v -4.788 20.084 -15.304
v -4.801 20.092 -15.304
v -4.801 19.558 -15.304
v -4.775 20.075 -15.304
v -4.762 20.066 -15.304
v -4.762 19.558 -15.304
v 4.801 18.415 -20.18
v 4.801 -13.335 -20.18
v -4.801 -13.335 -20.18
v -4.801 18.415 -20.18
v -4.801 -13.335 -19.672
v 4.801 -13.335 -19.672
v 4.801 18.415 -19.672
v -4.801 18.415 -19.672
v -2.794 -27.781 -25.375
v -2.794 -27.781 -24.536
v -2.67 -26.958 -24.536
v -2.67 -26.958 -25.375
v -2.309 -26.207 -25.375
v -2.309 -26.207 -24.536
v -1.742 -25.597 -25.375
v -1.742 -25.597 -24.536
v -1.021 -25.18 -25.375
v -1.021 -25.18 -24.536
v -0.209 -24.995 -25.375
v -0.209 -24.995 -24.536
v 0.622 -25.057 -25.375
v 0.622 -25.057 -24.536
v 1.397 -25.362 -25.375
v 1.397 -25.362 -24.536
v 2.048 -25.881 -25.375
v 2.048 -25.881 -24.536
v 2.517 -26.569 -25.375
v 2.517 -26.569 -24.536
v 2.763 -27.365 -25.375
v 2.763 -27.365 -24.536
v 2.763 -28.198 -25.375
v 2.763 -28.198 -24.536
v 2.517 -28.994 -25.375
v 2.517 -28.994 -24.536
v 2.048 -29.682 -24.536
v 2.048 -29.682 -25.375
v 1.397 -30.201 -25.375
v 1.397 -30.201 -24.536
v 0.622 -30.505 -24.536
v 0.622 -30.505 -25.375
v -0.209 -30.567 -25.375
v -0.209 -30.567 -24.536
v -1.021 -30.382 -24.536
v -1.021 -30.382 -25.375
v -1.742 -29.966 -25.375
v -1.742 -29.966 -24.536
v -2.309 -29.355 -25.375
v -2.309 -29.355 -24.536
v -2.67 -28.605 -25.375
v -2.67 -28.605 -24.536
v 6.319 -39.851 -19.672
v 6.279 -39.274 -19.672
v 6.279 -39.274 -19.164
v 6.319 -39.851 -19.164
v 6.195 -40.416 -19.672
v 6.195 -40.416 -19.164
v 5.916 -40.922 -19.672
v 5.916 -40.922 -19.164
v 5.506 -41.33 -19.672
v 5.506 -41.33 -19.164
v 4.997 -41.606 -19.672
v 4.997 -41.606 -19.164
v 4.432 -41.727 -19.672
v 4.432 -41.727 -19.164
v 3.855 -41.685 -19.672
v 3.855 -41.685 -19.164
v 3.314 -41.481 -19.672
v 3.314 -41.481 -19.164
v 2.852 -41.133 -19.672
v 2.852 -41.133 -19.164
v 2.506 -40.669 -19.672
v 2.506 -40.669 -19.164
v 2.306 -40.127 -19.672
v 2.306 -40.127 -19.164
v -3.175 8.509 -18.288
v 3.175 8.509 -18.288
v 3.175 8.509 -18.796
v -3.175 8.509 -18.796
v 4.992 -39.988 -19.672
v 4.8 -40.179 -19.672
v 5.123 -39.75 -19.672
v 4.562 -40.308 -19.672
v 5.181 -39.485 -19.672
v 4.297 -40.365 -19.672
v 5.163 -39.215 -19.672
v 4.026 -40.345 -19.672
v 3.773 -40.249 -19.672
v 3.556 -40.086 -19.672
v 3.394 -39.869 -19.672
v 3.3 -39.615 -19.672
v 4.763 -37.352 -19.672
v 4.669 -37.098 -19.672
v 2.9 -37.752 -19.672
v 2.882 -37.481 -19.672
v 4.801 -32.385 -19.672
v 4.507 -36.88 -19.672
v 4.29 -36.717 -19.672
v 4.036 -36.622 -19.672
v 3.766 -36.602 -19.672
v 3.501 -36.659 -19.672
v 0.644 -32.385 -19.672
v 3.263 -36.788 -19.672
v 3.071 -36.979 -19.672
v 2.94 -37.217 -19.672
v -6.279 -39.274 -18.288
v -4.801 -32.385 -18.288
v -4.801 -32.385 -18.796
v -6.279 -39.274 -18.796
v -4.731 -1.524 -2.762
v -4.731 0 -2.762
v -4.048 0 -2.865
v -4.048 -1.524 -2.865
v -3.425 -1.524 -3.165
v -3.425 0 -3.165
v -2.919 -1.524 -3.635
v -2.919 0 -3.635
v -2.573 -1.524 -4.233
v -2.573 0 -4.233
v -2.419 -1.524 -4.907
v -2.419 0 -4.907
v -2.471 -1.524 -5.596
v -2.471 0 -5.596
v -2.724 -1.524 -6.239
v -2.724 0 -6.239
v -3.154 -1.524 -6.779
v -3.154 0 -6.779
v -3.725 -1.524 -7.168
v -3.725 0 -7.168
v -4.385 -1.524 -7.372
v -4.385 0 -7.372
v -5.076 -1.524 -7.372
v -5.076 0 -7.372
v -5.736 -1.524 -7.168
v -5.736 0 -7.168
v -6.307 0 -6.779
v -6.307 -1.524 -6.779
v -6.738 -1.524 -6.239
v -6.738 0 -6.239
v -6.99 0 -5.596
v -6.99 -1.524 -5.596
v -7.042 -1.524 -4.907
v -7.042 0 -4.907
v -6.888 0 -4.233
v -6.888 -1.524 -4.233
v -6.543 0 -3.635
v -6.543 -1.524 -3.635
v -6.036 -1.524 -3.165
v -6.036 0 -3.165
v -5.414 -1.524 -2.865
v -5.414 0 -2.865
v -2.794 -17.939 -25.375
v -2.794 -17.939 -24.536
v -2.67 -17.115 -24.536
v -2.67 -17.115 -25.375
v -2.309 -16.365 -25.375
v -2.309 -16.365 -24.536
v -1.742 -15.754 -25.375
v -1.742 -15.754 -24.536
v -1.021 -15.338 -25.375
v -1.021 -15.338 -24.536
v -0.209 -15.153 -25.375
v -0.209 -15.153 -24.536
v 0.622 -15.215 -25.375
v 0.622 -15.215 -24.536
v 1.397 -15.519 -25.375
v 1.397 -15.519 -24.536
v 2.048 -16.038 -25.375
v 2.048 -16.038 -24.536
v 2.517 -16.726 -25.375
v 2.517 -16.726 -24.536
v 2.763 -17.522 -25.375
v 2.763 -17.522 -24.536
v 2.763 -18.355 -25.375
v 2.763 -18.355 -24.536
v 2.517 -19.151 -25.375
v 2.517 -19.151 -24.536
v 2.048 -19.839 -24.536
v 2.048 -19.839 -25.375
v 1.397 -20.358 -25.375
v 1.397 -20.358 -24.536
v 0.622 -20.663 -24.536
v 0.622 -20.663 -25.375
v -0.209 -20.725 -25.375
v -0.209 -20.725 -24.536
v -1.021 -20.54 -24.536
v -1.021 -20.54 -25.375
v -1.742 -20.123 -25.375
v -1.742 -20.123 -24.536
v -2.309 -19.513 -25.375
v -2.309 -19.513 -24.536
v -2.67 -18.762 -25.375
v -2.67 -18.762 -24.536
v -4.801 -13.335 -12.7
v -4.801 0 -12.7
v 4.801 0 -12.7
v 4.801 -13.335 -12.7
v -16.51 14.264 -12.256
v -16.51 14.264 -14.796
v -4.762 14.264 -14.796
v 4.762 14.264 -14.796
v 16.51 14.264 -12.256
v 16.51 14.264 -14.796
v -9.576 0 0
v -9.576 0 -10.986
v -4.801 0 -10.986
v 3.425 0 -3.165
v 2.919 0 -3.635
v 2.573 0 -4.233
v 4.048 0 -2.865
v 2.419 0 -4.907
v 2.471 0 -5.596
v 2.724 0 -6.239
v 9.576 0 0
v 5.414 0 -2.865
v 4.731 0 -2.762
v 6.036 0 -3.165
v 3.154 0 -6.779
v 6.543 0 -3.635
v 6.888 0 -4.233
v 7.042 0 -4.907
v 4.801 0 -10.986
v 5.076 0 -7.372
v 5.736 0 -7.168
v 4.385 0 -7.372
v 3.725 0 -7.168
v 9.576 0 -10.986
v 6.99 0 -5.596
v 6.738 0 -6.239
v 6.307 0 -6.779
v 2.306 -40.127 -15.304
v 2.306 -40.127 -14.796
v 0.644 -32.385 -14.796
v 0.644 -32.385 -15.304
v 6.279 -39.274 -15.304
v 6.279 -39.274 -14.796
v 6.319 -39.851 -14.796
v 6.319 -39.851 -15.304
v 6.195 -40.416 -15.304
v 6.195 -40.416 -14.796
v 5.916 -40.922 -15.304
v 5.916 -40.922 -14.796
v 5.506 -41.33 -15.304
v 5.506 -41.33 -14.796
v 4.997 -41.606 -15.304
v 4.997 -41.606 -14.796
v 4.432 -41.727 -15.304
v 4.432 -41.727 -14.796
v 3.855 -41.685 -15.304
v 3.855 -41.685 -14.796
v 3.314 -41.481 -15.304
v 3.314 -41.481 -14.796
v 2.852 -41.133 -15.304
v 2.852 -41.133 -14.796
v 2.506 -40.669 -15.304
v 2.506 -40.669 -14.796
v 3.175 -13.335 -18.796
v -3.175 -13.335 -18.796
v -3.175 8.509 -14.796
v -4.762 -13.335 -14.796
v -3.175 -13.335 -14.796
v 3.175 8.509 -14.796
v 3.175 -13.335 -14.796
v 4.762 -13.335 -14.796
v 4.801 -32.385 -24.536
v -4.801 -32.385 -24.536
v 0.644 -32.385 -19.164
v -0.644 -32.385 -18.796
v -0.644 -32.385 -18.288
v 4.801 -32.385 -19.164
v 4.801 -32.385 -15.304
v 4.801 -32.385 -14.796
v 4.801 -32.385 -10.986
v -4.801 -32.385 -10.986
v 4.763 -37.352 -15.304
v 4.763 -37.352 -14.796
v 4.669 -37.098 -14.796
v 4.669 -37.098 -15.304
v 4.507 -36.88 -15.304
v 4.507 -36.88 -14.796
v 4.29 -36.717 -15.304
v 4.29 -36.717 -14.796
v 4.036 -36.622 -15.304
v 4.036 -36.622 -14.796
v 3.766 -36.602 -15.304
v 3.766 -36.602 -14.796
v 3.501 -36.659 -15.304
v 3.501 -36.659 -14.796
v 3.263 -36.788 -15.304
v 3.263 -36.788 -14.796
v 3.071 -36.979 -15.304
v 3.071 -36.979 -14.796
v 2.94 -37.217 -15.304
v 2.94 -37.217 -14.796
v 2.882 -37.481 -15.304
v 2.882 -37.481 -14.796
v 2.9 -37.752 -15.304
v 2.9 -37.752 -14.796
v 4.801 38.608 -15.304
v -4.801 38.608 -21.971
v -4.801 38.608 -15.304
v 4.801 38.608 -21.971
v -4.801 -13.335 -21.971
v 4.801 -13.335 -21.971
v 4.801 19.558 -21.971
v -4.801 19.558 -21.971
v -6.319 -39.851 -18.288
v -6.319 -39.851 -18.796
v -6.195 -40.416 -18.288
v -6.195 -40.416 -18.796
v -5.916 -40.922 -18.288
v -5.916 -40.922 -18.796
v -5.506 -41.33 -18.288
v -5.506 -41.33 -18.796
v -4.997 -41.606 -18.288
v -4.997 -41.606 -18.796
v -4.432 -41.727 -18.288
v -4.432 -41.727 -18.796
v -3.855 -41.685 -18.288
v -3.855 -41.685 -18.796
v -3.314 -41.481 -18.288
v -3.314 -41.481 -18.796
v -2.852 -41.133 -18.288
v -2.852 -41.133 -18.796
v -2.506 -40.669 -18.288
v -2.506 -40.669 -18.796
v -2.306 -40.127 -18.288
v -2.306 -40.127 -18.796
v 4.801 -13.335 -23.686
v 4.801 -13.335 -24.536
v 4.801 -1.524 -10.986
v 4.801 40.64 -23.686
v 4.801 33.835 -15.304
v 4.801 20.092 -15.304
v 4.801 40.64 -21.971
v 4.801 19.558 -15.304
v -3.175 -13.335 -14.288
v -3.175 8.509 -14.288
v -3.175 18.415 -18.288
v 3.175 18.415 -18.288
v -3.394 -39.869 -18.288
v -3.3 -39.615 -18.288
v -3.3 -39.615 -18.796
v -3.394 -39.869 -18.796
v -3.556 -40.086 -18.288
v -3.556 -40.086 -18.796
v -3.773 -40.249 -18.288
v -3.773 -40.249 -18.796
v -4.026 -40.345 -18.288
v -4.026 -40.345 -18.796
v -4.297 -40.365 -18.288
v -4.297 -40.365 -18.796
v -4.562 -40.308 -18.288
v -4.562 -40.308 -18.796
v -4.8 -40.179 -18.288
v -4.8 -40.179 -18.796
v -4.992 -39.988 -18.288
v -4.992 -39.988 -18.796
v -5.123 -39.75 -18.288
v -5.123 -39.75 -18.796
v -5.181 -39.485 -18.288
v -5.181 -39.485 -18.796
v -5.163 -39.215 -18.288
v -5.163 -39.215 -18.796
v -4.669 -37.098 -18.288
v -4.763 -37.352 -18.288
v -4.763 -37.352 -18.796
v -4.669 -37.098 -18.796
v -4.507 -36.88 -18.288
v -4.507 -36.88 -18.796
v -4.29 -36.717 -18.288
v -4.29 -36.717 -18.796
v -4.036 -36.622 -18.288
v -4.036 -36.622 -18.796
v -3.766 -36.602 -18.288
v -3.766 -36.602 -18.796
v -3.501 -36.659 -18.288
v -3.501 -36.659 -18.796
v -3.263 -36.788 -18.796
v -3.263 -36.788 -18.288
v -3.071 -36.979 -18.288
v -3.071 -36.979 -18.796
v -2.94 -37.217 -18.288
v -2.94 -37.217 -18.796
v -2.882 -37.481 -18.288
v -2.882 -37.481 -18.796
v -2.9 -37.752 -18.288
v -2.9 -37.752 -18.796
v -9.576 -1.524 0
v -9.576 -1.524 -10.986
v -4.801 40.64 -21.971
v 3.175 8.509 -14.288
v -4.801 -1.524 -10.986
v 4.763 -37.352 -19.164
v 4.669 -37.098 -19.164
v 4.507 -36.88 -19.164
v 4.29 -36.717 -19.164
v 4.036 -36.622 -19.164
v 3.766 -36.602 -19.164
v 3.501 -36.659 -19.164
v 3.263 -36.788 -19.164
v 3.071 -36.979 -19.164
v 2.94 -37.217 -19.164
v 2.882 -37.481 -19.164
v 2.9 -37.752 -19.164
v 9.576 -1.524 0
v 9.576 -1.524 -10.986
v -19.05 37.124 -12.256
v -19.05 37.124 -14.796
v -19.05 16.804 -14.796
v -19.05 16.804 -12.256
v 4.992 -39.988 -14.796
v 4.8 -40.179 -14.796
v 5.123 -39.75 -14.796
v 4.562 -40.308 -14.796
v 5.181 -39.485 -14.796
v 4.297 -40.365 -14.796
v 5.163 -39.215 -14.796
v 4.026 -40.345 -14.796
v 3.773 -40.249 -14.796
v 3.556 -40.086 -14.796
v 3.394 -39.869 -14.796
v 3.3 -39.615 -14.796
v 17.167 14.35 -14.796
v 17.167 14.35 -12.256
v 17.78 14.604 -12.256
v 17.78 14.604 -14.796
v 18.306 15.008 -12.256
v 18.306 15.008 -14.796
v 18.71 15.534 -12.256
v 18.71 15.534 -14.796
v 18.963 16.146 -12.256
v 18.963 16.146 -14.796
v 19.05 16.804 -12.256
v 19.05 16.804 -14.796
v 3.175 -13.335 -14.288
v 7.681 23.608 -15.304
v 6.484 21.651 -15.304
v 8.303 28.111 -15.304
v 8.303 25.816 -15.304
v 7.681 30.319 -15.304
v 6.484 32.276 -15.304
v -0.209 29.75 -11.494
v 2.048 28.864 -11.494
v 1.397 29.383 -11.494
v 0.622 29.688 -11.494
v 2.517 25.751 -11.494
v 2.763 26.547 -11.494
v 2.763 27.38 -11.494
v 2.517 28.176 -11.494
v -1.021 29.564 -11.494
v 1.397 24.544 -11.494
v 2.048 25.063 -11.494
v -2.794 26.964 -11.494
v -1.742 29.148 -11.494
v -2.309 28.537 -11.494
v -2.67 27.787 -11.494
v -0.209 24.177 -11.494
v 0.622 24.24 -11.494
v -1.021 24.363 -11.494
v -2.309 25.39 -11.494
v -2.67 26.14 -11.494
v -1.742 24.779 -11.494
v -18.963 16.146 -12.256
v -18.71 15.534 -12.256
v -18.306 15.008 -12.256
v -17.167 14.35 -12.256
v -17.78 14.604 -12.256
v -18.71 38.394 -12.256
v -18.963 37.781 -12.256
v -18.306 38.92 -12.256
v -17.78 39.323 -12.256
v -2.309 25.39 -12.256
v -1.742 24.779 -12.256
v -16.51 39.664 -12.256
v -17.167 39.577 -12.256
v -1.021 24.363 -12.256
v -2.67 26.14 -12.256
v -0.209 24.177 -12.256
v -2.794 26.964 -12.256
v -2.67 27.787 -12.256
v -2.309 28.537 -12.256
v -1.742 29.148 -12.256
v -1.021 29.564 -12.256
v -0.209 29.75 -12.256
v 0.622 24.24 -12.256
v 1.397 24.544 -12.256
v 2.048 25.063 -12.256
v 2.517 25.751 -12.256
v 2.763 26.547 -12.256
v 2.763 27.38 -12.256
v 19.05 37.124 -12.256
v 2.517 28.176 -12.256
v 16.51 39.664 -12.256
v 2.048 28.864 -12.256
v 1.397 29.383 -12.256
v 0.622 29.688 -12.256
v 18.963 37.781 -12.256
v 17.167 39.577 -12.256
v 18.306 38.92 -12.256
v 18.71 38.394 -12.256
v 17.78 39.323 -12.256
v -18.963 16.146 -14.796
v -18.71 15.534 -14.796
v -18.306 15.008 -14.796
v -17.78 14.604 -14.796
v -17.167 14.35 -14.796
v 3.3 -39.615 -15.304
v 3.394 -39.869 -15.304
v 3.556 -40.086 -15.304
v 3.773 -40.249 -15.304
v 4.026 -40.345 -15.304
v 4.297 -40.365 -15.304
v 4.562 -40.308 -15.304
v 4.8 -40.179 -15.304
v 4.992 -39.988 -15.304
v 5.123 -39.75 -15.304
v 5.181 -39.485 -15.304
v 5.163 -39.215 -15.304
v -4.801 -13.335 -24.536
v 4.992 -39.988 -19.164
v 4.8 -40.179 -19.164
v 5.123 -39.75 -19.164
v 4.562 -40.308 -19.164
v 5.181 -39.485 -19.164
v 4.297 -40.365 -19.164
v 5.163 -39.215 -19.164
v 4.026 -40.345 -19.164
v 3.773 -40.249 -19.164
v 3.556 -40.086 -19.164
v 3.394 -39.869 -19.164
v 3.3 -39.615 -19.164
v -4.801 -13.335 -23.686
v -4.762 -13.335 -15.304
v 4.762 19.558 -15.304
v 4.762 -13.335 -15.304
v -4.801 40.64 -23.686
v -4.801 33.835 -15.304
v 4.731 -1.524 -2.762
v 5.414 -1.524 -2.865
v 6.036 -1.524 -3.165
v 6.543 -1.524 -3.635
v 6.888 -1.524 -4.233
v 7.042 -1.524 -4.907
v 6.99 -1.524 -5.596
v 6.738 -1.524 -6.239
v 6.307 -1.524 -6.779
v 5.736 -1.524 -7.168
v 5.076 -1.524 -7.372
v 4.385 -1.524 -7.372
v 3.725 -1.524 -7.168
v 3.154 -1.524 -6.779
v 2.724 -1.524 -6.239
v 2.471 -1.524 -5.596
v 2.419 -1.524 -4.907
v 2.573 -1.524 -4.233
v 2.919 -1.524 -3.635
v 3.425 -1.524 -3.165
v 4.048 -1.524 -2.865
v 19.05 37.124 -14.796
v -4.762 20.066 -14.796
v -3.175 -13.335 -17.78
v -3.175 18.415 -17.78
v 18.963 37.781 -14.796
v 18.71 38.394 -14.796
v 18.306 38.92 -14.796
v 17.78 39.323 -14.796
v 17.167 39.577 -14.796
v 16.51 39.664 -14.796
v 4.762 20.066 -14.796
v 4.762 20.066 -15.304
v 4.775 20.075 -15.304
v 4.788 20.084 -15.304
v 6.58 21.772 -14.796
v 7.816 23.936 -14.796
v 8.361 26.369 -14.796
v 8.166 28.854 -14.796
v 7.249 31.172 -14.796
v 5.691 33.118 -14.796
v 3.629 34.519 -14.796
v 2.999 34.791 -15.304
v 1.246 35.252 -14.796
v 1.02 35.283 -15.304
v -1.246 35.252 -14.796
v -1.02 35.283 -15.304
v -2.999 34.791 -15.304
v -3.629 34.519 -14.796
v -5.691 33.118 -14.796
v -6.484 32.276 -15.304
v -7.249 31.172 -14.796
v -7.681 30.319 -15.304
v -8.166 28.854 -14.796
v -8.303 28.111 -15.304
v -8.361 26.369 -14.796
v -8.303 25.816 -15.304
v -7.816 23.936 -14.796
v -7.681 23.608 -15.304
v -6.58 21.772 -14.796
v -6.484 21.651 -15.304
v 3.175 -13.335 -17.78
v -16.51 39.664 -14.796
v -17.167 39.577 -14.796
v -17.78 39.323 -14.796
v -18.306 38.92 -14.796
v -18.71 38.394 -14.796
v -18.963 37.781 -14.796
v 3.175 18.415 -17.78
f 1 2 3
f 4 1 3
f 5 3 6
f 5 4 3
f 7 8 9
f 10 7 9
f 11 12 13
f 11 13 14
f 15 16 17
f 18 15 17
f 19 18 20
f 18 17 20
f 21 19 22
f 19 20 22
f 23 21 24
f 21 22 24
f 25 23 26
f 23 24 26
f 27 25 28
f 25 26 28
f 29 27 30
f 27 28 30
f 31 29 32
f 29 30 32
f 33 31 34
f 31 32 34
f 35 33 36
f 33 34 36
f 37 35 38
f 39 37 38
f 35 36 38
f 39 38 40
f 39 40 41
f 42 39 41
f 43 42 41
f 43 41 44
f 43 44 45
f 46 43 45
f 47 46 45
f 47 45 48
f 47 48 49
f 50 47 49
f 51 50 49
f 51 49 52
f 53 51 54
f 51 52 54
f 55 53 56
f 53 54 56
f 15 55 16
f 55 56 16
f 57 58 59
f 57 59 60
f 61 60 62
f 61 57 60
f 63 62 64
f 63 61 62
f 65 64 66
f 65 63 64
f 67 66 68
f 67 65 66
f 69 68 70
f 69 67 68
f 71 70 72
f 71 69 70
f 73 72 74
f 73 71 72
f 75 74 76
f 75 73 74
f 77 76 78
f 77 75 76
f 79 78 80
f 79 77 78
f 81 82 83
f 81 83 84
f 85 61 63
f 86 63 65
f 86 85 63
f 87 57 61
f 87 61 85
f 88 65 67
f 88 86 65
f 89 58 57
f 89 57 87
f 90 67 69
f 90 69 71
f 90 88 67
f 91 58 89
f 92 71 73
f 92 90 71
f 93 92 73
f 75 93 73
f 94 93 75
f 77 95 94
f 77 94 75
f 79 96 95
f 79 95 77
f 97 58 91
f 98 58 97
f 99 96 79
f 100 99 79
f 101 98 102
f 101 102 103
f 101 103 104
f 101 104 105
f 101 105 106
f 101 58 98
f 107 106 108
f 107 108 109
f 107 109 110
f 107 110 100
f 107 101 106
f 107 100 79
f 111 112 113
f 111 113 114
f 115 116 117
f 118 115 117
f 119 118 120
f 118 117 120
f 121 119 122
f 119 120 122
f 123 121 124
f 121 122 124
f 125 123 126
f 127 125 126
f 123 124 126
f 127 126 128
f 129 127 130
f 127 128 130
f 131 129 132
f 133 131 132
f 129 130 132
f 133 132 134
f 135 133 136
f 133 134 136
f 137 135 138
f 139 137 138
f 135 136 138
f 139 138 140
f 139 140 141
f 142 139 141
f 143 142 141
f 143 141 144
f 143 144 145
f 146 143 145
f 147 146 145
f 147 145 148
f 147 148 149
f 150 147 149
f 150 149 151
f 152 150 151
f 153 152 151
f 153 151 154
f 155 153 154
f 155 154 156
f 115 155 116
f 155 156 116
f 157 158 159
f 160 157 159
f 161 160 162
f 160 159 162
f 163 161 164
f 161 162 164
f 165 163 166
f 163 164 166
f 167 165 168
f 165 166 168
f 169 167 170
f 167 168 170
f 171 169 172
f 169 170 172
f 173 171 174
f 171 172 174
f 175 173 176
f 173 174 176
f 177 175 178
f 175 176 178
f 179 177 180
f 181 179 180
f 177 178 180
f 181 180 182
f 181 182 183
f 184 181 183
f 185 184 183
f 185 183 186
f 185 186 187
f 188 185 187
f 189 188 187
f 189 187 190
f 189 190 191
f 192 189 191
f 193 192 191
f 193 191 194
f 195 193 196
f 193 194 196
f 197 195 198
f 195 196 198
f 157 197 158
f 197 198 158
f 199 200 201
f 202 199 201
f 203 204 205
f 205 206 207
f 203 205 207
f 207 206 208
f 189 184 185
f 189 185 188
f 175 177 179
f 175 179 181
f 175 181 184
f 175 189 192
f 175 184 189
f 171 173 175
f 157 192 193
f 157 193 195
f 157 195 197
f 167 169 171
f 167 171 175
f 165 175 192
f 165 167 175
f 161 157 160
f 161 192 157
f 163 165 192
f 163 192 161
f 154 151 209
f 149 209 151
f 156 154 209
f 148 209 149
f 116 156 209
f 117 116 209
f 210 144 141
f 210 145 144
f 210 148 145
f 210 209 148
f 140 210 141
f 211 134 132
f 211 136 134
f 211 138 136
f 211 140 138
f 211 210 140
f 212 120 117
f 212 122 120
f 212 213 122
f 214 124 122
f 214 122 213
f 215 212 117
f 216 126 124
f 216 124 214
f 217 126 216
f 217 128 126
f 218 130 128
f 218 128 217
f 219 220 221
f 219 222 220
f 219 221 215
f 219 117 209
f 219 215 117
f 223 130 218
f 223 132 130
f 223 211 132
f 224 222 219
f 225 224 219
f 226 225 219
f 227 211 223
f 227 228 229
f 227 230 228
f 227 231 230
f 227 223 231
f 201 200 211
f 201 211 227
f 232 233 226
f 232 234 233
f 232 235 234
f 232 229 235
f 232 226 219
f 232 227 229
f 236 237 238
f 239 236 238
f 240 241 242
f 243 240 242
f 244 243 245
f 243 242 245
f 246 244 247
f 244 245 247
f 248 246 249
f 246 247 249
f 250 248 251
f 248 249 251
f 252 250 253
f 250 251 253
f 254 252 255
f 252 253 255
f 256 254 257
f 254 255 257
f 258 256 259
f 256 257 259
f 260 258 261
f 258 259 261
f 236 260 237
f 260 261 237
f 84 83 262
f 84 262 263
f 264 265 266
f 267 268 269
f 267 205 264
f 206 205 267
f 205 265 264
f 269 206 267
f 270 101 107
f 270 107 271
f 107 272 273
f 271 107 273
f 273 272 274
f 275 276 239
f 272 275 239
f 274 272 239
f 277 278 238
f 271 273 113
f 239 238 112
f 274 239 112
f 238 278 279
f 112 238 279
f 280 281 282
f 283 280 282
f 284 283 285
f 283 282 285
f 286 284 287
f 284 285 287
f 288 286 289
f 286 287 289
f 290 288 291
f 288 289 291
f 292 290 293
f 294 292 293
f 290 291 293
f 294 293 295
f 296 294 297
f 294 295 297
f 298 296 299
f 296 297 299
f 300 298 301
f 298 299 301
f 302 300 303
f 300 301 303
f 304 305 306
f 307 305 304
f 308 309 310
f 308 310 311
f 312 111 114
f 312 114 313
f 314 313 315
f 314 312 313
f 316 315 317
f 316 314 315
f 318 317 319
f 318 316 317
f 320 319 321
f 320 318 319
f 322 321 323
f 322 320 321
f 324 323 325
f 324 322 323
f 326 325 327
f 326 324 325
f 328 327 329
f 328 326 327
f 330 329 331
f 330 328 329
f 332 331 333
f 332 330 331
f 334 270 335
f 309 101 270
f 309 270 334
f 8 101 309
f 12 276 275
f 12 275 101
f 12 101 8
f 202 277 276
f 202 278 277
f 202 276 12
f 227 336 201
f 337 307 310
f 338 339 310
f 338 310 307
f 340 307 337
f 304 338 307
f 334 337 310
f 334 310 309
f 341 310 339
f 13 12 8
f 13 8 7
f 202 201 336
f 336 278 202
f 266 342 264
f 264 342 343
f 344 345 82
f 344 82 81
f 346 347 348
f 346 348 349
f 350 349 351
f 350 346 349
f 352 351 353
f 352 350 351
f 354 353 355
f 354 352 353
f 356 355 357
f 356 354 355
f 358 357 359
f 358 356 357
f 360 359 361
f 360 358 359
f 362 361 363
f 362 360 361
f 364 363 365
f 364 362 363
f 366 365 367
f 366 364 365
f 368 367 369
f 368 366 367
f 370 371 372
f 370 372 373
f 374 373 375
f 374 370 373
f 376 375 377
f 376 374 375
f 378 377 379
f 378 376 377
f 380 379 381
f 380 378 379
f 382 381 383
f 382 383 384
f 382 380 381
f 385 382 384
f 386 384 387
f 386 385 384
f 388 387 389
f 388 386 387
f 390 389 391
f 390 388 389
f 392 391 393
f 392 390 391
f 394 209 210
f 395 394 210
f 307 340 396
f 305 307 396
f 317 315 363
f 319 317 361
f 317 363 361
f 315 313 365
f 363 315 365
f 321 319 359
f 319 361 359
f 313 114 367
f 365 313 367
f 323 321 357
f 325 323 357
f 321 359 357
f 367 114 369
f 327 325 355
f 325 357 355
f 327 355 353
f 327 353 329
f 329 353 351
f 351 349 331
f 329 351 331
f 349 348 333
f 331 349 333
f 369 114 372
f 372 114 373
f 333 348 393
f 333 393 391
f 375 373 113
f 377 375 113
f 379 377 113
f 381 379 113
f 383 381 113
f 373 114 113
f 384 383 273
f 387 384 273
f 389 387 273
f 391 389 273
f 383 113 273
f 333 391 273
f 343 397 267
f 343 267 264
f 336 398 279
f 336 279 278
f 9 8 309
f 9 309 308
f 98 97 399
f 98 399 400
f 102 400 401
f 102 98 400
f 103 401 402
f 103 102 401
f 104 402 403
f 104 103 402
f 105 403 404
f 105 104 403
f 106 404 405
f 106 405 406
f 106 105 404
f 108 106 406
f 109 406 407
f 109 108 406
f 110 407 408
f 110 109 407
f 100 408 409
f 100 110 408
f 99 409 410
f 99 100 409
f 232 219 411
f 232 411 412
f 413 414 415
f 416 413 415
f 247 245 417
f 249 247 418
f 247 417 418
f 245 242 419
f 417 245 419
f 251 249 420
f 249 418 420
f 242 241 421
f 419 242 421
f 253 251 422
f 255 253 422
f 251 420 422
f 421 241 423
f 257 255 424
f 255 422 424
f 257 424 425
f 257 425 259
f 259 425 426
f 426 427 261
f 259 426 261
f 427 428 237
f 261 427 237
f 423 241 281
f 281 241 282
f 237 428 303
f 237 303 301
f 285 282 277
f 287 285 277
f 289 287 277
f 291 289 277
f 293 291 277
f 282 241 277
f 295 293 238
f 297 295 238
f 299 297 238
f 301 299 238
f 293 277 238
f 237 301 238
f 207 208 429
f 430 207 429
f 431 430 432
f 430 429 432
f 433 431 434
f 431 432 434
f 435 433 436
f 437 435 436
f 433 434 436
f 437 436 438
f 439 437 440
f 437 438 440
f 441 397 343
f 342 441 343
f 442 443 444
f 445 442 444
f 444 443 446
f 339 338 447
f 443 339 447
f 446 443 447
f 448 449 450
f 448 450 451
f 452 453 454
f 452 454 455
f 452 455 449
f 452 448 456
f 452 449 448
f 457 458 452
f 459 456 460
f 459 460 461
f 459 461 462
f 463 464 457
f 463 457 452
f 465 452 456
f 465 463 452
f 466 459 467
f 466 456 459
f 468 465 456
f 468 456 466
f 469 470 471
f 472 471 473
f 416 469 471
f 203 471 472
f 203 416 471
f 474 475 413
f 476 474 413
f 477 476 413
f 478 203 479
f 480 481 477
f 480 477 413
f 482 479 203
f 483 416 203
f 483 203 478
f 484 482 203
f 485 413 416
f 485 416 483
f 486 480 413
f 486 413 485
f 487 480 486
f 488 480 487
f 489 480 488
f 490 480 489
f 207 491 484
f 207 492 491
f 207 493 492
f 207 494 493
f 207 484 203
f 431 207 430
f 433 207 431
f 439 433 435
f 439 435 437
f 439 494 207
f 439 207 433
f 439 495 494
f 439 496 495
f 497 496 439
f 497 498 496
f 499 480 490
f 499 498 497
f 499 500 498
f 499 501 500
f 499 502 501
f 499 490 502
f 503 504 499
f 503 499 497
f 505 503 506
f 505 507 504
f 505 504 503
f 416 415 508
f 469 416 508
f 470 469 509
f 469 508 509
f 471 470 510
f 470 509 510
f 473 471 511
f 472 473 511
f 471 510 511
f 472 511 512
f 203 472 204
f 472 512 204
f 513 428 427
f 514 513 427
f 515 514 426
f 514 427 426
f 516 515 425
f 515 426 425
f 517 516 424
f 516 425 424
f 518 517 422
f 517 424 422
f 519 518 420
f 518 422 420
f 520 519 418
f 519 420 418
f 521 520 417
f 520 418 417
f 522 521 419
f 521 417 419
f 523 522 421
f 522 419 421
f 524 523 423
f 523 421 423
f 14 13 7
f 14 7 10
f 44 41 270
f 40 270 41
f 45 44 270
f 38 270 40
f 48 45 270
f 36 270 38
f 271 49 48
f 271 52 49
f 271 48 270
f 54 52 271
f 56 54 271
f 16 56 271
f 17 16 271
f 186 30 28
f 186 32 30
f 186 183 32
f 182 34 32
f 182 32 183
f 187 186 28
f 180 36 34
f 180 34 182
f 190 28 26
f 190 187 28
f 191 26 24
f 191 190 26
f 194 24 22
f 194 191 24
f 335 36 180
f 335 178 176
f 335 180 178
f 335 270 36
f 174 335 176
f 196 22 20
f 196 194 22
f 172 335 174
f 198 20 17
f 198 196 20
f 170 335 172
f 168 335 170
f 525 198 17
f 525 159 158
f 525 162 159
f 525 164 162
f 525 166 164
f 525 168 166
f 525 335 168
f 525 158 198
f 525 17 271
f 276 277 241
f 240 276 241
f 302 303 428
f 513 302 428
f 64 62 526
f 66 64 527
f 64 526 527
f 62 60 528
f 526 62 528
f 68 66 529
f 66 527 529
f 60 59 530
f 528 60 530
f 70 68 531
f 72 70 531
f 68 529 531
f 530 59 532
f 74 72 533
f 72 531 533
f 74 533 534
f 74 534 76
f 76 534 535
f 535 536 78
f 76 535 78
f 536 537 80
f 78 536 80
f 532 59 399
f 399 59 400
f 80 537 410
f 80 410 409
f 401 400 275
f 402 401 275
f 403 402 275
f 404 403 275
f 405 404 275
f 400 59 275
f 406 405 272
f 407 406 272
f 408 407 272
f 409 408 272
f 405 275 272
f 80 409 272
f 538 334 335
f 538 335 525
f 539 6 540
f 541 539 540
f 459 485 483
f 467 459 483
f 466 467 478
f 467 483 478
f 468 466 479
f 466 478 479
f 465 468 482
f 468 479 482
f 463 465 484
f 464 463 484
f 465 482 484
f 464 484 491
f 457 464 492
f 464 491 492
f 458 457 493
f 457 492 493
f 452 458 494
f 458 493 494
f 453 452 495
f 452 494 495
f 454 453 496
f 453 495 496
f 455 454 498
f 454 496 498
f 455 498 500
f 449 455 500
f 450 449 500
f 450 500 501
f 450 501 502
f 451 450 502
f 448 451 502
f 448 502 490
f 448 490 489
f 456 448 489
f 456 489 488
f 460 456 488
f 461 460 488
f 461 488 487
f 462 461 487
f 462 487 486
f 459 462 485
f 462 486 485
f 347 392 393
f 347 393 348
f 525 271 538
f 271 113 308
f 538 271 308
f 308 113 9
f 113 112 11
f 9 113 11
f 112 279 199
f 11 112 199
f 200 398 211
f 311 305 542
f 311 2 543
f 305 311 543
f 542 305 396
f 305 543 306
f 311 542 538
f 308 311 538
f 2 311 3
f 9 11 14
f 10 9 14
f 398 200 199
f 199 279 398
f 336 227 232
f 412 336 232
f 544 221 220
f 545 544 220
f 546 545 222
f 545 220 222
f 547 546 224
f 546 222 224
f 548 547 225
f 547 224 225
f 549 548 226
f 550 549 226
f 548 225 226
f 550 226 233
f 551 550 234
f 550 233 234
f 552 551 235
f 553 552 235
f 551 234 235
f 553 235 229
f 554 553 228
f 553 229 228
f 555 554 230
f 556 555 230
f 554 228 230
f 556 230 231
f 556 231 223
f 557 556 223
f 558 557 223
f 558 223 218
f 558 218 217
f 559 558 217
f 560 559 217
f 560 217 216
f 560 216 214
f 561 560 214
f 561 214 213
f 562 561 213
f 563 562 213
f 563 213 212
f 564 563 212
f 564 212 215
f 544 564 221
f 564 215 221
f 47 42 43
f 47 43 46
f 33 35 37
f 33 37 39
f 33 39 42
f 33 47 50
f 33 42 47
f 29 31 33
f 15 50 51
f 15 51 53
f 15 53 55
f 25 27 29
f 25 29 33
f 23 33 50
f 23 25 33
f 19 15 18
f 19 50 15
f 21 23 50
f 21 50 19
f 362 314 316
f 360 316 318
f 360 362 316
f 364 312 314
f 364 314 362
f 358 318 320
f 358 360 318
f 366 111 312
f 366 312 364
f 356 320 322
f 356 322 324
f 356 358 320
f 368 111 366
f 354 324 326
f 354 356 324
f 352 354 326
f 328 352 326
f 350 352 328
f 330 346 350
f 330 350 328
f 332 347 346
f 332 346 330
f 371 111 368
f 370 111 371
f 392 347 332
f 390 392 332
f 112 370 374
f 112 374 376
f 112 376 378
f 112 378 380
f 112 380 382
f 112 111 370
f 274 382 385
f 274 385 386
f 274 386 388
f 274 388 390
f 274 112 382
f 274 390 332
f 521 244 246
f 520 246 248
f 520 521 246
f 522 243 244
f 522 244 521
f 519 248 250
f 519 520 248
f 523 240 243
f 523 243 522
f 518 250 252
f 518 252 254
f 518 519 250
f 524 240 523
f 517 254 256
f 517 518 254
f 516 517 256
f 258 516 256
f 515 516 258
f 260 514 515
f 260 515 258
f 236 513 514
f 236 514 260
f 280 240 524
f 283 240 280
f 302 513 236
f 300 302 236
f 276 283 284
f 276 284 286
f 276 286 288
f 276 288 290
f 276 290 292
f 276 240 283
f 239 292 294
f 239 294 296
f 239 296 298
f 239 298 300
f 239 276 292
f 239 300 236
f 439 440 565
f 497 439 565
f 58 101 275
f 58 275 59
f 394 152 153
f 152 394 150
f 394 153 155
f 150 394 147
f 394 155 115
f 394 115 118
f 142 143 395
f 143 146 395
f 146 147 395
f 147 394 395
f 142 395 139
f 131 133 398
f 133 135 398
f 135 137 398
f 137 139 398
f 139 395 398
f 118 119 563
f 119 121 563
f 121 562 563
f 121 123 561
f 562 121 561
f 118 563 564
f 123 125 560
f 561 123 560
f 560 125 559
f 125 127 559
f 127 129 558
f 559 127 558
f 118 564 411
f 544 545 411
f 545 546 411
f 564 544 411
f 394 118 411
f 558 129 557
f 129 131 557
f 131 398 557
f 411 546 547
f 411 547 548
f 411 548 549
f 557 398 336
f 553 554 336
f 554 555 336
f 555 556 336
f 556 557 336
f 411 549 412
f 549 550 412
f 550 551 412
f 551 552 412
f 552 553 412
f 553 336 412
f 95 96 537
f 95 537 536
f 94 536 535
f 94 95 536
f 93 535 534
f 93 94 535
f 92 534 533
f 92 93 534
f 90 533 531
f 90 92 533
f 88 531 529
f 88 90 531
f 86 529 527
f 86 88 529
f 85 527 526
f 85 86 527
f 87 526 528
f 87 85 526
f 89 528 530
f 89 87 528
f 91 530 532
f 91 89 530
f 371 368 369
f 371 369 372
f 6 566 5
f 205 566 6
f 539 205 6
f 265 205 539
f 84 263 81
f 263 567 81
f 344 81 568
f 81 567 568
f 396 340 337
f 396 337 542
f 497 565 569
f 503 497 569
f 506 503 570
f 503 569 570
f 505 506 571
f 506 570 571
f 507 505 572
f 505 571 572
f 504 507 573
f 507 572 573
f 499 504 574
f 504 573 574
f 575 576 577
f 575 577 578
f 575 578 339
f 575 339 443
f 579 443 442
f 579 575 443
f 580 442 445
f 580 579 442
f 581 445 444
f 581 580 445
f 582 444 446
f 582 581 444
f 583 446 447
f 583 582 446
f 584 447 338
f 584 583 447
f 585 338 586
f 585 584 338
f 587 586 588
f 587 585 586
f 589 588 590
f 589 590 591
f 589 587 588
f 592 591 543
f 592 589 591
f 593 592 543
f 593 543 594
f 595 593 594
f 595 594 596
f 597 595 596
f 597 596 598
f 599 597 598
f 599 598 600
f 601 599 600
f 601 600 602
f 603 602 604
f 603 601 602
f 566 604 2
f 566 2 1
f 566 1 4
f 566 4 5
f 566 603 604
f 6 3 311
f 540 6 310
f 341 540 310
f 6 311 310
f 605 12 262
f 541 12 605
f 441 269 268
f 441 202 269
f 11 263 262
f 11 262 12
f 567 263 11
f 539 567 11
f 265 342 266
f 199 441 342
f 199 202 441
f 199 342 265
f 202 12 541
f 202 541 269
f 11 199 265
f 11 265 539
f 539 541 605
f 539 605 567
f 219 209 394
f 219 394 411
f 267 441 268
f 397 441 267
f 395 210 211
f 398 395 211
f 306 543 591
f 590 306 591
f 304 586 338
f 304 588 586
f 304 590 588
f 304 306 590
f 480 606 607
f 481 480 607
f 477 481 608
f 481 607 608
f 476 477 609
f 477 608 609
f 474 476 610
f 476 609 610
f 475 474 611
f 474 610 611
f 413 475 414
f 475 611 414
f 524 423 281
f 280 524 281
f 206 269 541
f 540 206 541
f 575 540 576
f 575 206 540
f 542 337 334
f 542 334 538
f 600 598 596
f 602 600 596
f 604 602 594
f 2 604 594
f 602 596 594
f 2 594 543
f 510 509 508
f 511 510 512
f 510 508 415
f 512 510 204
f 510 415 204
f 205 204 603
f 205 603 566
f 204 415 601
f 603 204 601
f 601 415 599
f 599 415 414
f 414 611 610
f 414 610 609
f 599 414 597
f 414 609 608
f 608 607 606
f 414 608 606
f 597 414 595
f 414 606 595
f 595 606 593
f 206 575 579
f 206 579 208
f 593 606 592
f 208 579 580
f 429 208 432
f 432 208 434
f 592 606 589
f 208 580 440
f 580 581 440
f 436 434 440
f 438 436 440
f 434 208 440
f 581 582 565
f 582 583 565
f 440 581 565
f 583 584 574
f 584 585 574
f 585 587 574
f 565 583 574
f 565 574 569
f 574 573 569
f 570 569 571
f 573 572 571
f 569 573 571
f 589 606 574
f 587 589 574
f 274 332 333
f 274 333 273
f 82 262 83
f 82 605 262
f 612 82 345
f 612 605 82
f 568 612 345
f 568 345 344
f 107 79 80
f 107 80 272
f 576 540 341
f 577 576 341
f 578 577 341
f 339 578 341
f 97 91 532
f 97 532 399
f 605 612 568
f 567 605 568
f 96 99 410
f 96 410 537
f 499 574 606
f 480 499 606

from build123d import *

# Parameters (mm, degrees)
SKETCH2_W              = 19.1516
SKETCH2_H              = 10.9855
SKETCH2_R              = 2.31775
BOSS_EXTRUDE1_DEPTH    = 1.524
SKETCH3_W              = 9.6012
SKETCH3_H              = 1.7145
BOSS_EXTRUDE2_DEPTH    = 32.385
SKETCH4_W              = 9.6012
SKETCH4_H              = 19.05
BOSS_EXTRUDE3_DEPTH    = 9.271
SKETCH5_W              = 9.6012
SKETCH5_H              = 73.025
BOSS_EXTRUDE4_DEPTH    = 1.7145
SKETCH6_W              = 9.6012
SKETCH6_H              = 19.05
BOSS_EXTRUDE5_DEPTH    = 0.8509
SKETCH7_W              = 6.35
SKETCH7_H              = 21.844
BOSS_EXTRUDE6_DEPTH    = 0.508
BOSS_EXTRUDE7_DEPTH    = 0.508
SKETCH9_W              = 6.35
SKETCH9_H              = 31.75
BOSS_EXTRUDE8_DEPTH    = 0.508
SKETCH10_W             = 6.35
SKETCH10_H             = 21.844
BOSS_EXTRUDE9_DEPTH    = 0.508
SKETCH11_W             = 9.6012
SKETCH11_H             = 31.75
BOSS_EXTRUDE10_DEPTH   = 0.508
BOSS_EXTRUDE11_DEPTH   = 2.54
SKETCH13_R             = 2.794
BOSS_EXTRUDE12_DEPTH   = 0.762
SKETCH14_W             = 9.6012
SKETCH14_H             = 19.05
BOSS_EXTRUDE13_DEPTH   = 6.6675
BOSS_EXTRUDE14_DEPTH   = 0.508
BOSS_EXTRUDE15_DEPTH   = 0.508
BOSS_EXTRUDE16_DEPTH   = 0.508
SKETCH19_R             = 2.794
BOSS_EXTRUDE17_DEPTH   = 0.8382
BOSS_EXTRUDE17_2_DEPTH = 0.8382


with BuildPart() as part:
    # Sketch2 → Boss-Extrude1 (new body)
    with BuildSketch(Plane(origin=(0, 0, 0), x_dir=(1, 0, 0), z_dir=(0, 1, 0))):
        with Locations((0, 5.49275)):
            Rectangle(SKETCH2_W, SKETCH2_H)
        with Locations(Location((-4.73075, 5.08, 0), (0, 0, 270))):
            Circle(SKETCH2_R, mode=Mode.SUBTRACT)
        with Locations(Location((4.73075, 5.08, 0), (0, 0, 270))):
            Circle(SKETCH2_R, mode=Mode.SUBTRACT)
    extrude(amount=-BOSS_EXTRUDE1_DEPTH)

    # Sketch3 → Boss-Extrude2 (add)
    with BuildSketch(Plane(origin=(0, 0, 0), x_dir=(1, 0, 0), z_dir=(0, 1, 0))):
        with Locations((0, 11.84275)):
            Rectangle(SKETCH3_W, SKETCH3_H)
    extrude(amount=-BOSS_EXTRUDE2_DEPTH)


with BuildPart() as body_2:
    # Sketch4 → Boss-Extrude3 (new body)
    with BuildSketch(Plane(origin=(0, 0, -12.7), x_dir=(-1, 0, 0), z_dir=(0, 0, -1))):
        with Locations((0, -22.86)):
            Rectangle(SKETCH4_W, SKETCH4_H)
    extrude(amount=BOSS_EXTRUDE3_DEPTH)

    # Sketch7 → Boss-Extrude6 (add)
    with BuildSketch(Plane(origin=(0, 0, -14.2875), x_dir=(-1, 0, 0), z_dir=(0, 0, -1))):
        with Locations((0, -2.413)):
            Rectangle(SKETCH7_W, SKETCH7_H)
    extrude(amount=BOSS_EXTRUDE6_DEPTH)

    # Sketch15 → Boss-Extrude14 (add)
    with BuildSketch(Plane(origin=(0, 0, -14.7955), x_dir=(-1, 0, 0), z_dir=(0, 0, -1))):
        with BuildLine():
            Line((-4.8006, -32.385), (-6.279341549, -39.273723719))
            ThreePointArc((-6.279341549, -39.273723719), (-4.719076281, -41.686941549), (-2.305858451, -40.126676281))
            Line((-2.305858451, -40.126676281), (-0.644021101, -32.385))
            Line((-0.644021101, -32.385), (-4.8006, -32.385))
        make_face()
        with BuildLine():
            Line((-2.90018742, -37.751946457), (-3.300008934, -39.614516659))
            ThreePointArc((-3.300008934, -39.614516659), (-4.431204791, -40.345891003), (-5.162579136, -39.214695145))
            Line((-5.162579136, -39.214695145), (-4.762757622, -37.352124944))
            ThreePointArc((-4.762757622, -37.352124944), (-3.631561764, -36.620750599), (-2.90018742, -37.751946457))
        make_face(mode=Mode.SUBTRACT)
    extrude(amount=BOSS_EXTRUDE14_DEPTH)

    # Sketch17 → Boss-Extrude15 (add)
    with BuildSketch(Plane(origin=(0, 0, -18.288), x_dir=(-1, 0, 0), z_dir=(0, 0, -1))):
        with BuildLine():
            Line((4.8006, -32.385), (6.279341549, -39.273723719))
            ThreePointArc((6.279341549, -39.273723719), (4.719076281, -41.686941549), (2.305858451, -40.126676281))
            Line((2.305858451, -40.126676281), (0.644021101, -32.385))
            Line((0.644021101, -32.385), (4.8006, -32.385))
        make_face()
        with BuildLine():
            Line((2.90018742, -37.751946457), (3.300008934, -39.614516659))
            ThreePointArc((3.300008934, -39.614516659), (4.431204791, -40.345891003), (5.162579136, -39.214695145))
            Line((5.162579136, -39.214695145), (4.762757622, -37.352124944))
            ThreePointArc((4.762757622, -37.352124944), (3.631561764, -36.620750599), (2.90018742, -37.751946457))
        make_face(mode=Mode.SUBTRACT)
    extrude(amount=BOSS_EXTRUDE15_DEPTH)

    # Sketch18 → Boss-Extrude16 (add)
    with BuildSketch(Plane.XY.offset(-19.6723)):
        with BuildLine():
            Line((4.8006, -32.385), (6.279341549, -39.273723719))
            ThreePointArc((6.279341549, -39.273723719), (4.719076281, -41.686941549), (2.305858451, -40.126676281))
            Line((2.305858451, -40.126676281), (0.644021101, -32.385))
            Line((0.644021101, -32.385), (4.8006, -32.385))
        make_face()
        with BuildLine():
            Line((2.90018742, -37.751946457), (3.300008934, -39.614516659))
            ThreePointArc((3.300008934, -39.614516659), (4.431204791, -40.345891003), (5.162579136, -39.214695145))
            Line((5.162579136, -39.214695145), (4.762757622, -37.352124944))
            ThreePointArc((4.762757622, -37.352124944), (3.631561764, -36.620750599), (2.90018742, -37.751946457))
        make_face(mode=Mode.SUBTRACT)
    extrude(amount=BOSS_EXTRUDE16_DEPTH)


with BuildPart() as body_3:
    # Sketch5 → Boss-Extrude4 (new body)
    with BuildSketch(Plane(origin=(0, 0, -21.971), x_dir=(-1, 0, 0), z_dir=(0, 0, -1))):
        with Locations((0, 4.1275)):
            Rectangle(SKETCH5_W, SKETCH5_H)
    extrude(amount=BOSS_EXTRUDE4_DEPTH)


with BuildPart() as body_4:
    # Sketch6 → Boss-Extrude5 (new body)
    with BuildSketch(Plane(origin=(0, 0, -23.6855), x_dir=(-1, 0, 0), z_dir=(0, 0, -1))):
        with Locations((0, -22.86)):
            Rectangle(SKETCH6_W, SKETCH6_H)
    extrude(amount=BOSS_EXTRUDE5_DEPTH)


with BuildPart() as body_5:
    # Sketch8 → Boss-Extrude7 (new body)
    with BuildSketch(Plane(origin=(0, 0, -14.7955), x_dir=(-1, 0, 0), z_dir=(0, 0, -1))):
        with BuildLine():
            Line((4.7625, -13.335), (-4.7625, -13.335))
            Line((-4.7625, -13.335), (-4.7625, 20.066))
            ThreePointArc((-4.7625, 20.066), (0, 35.345573323), (4.7625, 20.066))
            Line((4.7625, 20.066), (4.7625, -13.335))
        make_face()
    extrude(amount=BOSS_EXTRUDE7_DEPTH)

    # Sketch12 → Boss-Extrude11 (add)
    with BuildSketch(Plane.XY.offset(-14.7955)):
        with BuildLine():
            Line((-16.51, 14.263573323), (16.51, 14.263573323))
            ThreePointArc((16.51, 14.263573323), (18.306051224, 15.007522099), (19.05, 16.803573323))
            Line((19.05, 16.803573323), (19.05, 37.123573323))
            ThreePointArc((19.05, 37.123573323), (18.306051224, 38.919624547), (16.51, 39.663573323))
            Line((16.51, 39.663573323), (-16.51, 39.663573323))
            ThreePointArc((-16.51, 39.663573323), (-18.306051224, 38.919624547), (-19.05, 37.123573323))
            Line((-19.05, 37.123573323), (-19.05, 16.803573323))
            ThreePointArc((-19.05, 16.803573323), (-18.306051224, 15.007522099), (-16.51, 14.263573323))
        make_face()
    extrude(amount=BOSS_EXTRUDE11_DEPTH)

    # Sketch13 → Boss-Extrude12 (add)
    with BuildSketch(Plane.XY.offset(-12.2555)):
        with Locations(Location((0, 26.963573323, 0), (0, 0, 180))):
            Circle(SKETCH13_R)
    extrude(amount=BOSS_EXTRUDE12_DEPTH)


with BuildPart() as body_6:
    # Sketch9 → Boss-Extrude8 (new body)
    with BuildSketch(Plane(origin=(0, 0, -17.78), x_dir=(-1, 0, 0), z_dir=(0, 0, -1))):
        with Locations((0, 2.54)):
            Rectangle(SKETCH9_W, SKETCH9_H)
    extrude(amount=BOSS_EXTRUDE8_DEPTH)


with BuildPart() as body_7:
    # Sketch10 → Boss-Extrude9 (new body)
    with BuildSketch(Plane(origin=(0, 0, -18.288), x_dir=(-1, 0, 0), z_dir=(0, 0, -1))):
        with Locations((0, -2.413)):
            Rectangle(SKETCH10_W, SKETCH10_H)
    extrude(amount=BOSS_EXTRUDE9_DEPTH)


with BuildPart() as body_8:
    # Sketch11 → Boss-Extrude10 (new body)
    with BuildSketch(Plane(origin=(0, 0, -19.6723), x_dir=(-1, 0, 0), z_dir=(0, 0, -1))):
        with Locations((0, 2.54)):
            Rectangle(SKETCH11_W, SKETCH11_H)
    extrude(amount=BOSS_EXTRUDE10_DEPTH)


with BuildPart() as body_9:
    # Sketch14 → Boss-Extrude13 (new body)
    with BuildSketch(Plane.XY.offset(-21.971)):
        with Locations((0, 29.083)):
            Rectangle(SKETCH14_W, SKETCH14_H)
    extrude(amount=BOSS_EXTRUDE13_DEPTH)


with BuildPart() as body_10:
    # Sketch19 → Boss-Extrude17 (new body)
    with BuildSketch(Plane(origin=(0, 0, -24.5364), x_dir=(-1, 0, 0), z_dir=(0, 0, -1))):
        with Locations((0, -17.93875)):
            Circle(SKETCH19_R)
    extrude(amount=BOSS_EXTRUDE17_DEPTH)


with BuildPart() as body_11:
    # Sketch19 → Boss-Extrude17 2 (new body)
    with BuildSketch(Plane(origin=(0, 0, -24.5364), x_dir=(-1, 0, 0), z_dir=(0, 0, -1))):
        with Locations((0, -27.78125)):
            Circle(SKETCH19_R)
    extrude(amount=BOSS_EXTRUDE17_2_DEPTH)


with BuildPart() as part_1:
    add(part.part)

    # Combine1: union body 3, body 4, body 6, body 7, body 8, body 5, body 9, body 2, body 10, body 11
    add(body_3.part)
    add(body_4.part)
    add(body_6.part)
    add(body_7.part)
    add(body_8.part)
    add(body_5.part)
    add(body_9.part)
    add(body_2.part)
    add(body_10.part)
    add(body_11.part)


solid = part_1.part
